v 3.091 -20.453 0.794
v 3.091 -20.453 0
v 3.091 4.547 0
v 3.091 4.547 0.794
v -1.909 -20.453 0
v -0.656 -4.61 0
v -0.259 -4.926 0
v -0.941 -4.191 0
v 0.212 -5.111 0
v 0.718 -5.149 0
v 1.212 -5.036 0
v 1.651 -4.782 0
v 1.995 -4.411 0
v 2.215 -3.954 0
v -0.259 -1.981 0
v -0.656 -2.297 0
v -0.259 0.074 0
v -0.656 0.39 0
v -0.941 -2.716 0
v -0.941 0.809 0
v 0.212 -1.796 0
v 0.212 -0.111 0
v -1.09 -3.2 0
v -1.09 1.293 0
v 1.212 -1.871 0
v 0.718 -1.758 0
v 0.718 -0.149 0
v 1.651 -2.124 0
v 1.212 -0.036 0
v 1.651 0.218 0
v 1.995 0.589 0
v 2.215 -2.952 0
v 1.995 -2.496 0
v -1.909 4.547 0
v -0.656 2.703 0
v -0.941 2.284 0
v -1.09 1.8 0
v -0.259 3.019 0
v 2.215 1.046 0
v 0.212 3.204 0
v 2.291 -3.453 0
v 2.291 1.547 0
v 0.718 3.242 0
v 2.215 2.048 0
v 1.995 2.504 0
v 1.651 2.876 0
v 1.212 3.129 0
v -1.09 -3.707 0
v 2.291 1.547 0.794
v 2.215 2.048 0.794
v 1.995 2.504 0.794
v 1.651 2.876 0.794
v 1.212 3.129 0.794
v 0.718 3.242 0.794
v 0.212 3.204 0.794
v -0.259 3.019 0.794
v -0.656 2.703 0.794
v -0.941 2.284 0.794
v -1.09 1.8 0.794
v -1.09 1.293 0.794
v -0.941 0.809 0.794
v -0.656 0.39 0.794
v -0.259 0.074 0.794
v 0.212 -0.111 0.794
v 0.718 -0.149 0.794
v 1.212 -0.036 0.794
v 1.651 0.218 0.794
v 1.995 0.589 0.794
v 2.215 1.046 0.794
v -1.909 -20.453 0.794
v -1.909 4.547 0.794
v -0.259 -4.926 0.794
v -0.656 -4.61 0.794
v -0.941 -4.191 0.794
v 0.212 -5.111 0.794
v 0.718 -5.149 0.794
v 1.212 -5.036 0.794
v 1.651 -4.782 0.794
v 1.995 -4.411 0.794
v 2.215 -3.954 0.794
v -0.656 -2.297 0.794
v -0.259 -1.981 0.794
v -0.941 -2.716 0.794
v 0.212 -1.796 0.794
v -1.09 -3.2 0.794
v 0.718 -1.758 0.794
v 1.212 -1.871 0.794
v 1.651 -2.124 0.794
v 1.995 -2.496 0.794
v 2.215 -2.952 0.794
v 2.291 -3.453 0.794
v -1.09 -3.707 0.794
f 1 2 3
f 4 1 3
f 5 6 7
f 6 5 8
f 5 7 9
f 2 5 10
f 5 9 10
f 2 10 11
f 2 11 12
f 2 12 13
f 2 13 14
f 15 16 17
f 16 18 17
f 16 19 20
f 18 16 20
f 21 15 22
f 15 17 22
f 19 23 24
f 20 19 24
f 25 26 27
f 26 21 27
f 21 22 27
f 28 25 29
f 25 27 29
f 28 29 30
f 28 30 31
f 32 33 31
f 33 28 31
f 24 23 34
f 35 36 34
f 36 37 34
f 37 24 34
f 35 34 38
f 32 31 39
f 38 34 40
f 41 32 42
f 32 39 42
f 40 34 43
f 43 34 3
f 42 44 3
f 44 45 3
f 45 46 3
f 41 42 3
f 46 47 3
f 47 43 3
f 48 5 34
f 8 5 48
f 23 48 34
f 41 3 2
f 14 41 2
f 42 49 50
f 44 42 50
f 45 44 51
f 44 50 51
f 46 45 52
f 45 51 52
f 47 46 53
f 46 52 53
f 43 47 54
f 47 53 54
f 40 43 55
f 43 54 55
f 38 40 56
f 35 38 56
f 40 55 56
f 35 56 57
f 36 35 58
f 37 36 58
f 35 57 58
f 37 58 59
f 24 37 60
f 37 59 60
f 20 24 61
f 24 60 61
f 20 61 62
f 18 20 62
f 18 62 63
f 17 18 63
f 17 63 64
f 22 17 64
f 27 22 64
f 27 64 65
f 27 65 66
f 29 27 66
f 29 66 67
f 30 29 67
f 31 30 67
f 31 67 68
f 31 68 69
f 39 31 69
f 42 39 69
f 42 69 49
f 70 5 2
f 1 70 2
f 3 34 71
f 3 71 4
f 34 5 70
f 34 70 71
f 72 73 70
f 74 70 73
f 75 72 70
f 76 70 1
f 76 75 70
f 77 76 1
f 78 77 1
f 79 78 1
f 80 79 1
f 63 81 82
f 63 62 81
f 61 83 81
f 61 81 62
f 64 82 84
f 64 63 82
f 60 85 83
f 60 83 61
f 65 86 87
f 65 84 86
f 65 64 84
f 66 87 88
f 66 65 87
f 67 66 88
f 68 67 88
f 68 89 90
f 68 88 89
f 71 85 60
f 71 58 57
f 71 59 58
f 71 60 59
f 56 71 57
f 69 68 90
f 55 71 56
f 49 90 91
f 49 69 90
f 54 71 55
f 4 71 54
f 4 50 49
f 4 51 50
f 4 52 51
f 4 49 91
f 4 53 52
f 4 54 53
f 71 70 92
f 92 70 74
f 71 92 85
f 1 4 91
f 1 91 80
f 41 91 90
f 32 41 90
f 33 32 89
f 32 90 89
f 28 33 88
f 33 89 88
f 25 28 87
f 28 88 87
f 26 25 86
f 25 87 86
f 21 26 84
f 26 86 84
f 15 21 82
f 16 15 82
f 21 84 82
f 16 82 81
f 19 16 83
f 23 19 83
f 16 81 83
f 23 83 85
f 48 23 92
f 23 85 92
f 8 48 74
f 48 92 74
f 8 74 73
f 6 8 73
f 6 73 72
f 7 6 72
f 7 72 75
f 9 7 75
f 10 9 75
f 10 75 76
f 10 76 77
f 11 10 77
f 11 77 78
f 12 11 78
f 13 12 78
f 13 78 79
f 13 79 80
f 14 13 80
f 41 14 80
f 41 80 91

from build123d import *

# Parameters (mm, degrees)
SKETCH1_W            = 5
SKETCH1_H            = 25
BOSS_EXTRUDE1_DEPTH  = 0.79375
M3_CLEARANCE_HOLE1_D = 3.4


with BuildPart() as part:
    # Sketch1 → Boss-Extrude1 (new body)
    with BuildSketch(Plane.XY):
        with Locations((0.590659341, -7.953296703)):
            Rectangle(SKETCH1_W, SKETCH1_H)
    extrude(amount=BOSS_EXTRUDE1_DEPTH)

    # M3 Clearance Hole1 (through all)
    with Locations(Plane(origin=(0, 0, 0), x_dir=(-1, 0, 0), z_dir=(0, 0, -1))):
        with Locations((-0.590659341, 1.546703297), (-0.590659341, -3.453296703)):
            Hole(M3_CLEARANCE_HOLE1_D / 2)


solid = part.part
